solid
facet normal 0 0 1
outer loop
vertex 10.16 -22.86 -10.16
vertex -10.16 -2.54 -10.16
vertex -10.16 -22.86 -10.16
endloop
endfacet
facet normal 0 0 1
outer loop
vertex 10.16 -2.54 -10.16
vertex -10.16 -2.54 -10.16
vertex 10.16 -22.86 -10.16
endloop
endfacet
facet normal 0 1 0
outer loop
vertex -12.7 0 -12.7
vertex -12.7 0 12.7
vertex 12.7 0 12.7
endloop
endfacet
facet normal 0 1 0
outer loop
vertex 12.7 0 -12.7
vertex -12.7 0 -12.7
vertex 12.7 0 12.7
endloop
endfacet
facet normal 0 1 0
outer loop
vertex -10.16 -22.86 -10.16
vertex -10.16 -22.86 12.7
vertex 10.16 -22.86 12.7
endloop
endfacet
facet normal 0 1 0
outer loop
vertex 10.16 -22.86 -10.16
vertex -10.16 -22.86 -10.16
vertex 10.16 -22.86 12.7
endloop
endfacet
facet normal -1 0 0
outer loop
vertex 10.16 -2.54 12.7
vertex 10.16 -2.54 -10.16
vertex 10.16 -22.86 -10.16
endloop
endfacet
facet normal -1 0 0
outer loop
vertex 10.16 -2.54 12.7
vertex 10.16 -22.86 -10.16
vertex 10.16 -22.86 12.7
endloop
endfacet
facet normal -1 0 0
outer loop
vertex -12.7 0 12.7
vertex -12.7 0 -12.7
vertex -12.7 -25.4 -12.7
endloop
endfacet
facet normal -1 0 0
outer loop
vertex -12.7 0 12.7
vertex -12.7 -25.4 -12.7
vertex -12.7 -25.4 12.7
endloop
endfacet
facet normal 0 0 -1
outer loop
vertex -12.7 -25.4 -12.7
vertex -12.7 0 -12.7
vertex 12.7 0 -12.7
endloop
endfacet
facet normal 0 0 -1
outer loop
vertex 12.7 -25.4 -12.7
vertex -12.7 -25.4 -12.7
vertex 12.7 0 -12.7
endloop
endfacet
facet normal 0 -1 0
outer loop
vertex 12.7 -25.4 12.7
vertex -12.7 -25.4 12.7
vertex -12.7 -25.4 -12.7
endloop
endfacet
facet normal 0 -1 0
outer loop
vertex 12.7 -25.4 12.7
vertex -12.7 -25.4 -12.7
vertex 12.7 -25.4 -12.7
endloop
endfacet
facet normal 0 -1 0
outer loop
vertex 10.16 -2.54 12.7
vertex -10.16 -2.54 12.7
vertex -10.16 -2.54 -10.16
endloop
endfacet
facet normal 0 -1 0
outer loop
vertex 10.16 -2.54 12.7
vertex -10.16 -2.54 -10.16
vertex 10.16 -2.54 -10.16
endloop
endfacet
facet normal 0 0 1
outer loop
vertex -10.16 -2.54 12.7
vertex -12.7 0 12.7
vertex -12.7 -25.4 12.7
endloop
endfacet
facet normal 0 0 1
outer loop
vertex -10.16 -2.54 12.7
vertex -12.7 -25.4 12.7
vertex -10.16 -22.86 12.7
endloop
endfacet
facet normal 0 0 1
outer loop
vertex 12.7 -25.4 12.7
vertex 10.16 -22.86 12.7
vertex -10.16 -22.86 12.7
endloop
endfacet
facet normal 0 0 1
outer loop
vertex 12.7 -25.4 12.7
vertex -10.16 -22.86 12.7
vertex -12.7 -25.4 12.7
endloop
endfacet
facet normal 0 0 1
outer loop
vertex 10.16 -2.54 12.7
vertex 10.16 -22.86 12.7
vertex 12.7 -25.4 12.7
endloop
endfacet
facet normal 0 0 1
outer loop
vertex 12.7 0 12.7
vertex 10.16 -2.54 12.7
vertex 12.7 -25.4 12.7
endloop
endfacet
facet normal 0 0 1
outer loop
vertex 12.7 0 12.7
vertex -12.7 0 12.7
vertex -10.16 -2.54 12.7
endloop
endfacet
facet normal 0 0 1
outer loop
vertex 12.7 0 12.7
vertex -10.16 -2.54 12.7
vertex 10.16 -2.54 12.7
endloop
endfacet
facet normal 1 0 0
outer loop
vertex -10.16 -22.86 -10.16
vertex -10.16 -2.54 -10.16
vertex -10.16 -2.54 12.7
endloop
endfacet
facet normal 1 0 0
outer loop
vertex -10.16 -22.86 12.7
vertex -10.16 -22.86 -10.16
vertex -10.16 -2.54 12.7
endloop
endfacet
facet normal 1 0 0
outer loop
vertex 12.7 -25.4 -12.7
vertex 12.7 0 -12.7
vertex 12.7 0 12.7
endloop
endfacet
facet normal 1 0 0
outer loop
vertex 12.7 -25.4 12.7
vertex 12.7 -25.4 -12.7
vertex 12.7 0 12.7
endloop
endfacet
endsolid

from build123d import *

# Parameters (mm, degrees)
F0_W     = 25.4
F0_H     = 25.4
F1_DEPTH = 25.4
F2_T     = -2.54


with BuildPart() as f1:
    # F0 (on Front) → F1 (new body)
    with BuildSketch(Plane.XZ):
        Rectangle(F0_W, F0_H)
    extrude(amount=F1_DEPTH)

    # F2
    f2_openings = [f1.faces().sort_by_distance(p)[0] for p in [
        (0, -12.7, 12.7),
    ]]
    offset(amount=F2_T, openings=f2_openings)


with BuildPart() as f3_1:
    # F3: copy of F1
    add(f1.part)


solid = f1.part
